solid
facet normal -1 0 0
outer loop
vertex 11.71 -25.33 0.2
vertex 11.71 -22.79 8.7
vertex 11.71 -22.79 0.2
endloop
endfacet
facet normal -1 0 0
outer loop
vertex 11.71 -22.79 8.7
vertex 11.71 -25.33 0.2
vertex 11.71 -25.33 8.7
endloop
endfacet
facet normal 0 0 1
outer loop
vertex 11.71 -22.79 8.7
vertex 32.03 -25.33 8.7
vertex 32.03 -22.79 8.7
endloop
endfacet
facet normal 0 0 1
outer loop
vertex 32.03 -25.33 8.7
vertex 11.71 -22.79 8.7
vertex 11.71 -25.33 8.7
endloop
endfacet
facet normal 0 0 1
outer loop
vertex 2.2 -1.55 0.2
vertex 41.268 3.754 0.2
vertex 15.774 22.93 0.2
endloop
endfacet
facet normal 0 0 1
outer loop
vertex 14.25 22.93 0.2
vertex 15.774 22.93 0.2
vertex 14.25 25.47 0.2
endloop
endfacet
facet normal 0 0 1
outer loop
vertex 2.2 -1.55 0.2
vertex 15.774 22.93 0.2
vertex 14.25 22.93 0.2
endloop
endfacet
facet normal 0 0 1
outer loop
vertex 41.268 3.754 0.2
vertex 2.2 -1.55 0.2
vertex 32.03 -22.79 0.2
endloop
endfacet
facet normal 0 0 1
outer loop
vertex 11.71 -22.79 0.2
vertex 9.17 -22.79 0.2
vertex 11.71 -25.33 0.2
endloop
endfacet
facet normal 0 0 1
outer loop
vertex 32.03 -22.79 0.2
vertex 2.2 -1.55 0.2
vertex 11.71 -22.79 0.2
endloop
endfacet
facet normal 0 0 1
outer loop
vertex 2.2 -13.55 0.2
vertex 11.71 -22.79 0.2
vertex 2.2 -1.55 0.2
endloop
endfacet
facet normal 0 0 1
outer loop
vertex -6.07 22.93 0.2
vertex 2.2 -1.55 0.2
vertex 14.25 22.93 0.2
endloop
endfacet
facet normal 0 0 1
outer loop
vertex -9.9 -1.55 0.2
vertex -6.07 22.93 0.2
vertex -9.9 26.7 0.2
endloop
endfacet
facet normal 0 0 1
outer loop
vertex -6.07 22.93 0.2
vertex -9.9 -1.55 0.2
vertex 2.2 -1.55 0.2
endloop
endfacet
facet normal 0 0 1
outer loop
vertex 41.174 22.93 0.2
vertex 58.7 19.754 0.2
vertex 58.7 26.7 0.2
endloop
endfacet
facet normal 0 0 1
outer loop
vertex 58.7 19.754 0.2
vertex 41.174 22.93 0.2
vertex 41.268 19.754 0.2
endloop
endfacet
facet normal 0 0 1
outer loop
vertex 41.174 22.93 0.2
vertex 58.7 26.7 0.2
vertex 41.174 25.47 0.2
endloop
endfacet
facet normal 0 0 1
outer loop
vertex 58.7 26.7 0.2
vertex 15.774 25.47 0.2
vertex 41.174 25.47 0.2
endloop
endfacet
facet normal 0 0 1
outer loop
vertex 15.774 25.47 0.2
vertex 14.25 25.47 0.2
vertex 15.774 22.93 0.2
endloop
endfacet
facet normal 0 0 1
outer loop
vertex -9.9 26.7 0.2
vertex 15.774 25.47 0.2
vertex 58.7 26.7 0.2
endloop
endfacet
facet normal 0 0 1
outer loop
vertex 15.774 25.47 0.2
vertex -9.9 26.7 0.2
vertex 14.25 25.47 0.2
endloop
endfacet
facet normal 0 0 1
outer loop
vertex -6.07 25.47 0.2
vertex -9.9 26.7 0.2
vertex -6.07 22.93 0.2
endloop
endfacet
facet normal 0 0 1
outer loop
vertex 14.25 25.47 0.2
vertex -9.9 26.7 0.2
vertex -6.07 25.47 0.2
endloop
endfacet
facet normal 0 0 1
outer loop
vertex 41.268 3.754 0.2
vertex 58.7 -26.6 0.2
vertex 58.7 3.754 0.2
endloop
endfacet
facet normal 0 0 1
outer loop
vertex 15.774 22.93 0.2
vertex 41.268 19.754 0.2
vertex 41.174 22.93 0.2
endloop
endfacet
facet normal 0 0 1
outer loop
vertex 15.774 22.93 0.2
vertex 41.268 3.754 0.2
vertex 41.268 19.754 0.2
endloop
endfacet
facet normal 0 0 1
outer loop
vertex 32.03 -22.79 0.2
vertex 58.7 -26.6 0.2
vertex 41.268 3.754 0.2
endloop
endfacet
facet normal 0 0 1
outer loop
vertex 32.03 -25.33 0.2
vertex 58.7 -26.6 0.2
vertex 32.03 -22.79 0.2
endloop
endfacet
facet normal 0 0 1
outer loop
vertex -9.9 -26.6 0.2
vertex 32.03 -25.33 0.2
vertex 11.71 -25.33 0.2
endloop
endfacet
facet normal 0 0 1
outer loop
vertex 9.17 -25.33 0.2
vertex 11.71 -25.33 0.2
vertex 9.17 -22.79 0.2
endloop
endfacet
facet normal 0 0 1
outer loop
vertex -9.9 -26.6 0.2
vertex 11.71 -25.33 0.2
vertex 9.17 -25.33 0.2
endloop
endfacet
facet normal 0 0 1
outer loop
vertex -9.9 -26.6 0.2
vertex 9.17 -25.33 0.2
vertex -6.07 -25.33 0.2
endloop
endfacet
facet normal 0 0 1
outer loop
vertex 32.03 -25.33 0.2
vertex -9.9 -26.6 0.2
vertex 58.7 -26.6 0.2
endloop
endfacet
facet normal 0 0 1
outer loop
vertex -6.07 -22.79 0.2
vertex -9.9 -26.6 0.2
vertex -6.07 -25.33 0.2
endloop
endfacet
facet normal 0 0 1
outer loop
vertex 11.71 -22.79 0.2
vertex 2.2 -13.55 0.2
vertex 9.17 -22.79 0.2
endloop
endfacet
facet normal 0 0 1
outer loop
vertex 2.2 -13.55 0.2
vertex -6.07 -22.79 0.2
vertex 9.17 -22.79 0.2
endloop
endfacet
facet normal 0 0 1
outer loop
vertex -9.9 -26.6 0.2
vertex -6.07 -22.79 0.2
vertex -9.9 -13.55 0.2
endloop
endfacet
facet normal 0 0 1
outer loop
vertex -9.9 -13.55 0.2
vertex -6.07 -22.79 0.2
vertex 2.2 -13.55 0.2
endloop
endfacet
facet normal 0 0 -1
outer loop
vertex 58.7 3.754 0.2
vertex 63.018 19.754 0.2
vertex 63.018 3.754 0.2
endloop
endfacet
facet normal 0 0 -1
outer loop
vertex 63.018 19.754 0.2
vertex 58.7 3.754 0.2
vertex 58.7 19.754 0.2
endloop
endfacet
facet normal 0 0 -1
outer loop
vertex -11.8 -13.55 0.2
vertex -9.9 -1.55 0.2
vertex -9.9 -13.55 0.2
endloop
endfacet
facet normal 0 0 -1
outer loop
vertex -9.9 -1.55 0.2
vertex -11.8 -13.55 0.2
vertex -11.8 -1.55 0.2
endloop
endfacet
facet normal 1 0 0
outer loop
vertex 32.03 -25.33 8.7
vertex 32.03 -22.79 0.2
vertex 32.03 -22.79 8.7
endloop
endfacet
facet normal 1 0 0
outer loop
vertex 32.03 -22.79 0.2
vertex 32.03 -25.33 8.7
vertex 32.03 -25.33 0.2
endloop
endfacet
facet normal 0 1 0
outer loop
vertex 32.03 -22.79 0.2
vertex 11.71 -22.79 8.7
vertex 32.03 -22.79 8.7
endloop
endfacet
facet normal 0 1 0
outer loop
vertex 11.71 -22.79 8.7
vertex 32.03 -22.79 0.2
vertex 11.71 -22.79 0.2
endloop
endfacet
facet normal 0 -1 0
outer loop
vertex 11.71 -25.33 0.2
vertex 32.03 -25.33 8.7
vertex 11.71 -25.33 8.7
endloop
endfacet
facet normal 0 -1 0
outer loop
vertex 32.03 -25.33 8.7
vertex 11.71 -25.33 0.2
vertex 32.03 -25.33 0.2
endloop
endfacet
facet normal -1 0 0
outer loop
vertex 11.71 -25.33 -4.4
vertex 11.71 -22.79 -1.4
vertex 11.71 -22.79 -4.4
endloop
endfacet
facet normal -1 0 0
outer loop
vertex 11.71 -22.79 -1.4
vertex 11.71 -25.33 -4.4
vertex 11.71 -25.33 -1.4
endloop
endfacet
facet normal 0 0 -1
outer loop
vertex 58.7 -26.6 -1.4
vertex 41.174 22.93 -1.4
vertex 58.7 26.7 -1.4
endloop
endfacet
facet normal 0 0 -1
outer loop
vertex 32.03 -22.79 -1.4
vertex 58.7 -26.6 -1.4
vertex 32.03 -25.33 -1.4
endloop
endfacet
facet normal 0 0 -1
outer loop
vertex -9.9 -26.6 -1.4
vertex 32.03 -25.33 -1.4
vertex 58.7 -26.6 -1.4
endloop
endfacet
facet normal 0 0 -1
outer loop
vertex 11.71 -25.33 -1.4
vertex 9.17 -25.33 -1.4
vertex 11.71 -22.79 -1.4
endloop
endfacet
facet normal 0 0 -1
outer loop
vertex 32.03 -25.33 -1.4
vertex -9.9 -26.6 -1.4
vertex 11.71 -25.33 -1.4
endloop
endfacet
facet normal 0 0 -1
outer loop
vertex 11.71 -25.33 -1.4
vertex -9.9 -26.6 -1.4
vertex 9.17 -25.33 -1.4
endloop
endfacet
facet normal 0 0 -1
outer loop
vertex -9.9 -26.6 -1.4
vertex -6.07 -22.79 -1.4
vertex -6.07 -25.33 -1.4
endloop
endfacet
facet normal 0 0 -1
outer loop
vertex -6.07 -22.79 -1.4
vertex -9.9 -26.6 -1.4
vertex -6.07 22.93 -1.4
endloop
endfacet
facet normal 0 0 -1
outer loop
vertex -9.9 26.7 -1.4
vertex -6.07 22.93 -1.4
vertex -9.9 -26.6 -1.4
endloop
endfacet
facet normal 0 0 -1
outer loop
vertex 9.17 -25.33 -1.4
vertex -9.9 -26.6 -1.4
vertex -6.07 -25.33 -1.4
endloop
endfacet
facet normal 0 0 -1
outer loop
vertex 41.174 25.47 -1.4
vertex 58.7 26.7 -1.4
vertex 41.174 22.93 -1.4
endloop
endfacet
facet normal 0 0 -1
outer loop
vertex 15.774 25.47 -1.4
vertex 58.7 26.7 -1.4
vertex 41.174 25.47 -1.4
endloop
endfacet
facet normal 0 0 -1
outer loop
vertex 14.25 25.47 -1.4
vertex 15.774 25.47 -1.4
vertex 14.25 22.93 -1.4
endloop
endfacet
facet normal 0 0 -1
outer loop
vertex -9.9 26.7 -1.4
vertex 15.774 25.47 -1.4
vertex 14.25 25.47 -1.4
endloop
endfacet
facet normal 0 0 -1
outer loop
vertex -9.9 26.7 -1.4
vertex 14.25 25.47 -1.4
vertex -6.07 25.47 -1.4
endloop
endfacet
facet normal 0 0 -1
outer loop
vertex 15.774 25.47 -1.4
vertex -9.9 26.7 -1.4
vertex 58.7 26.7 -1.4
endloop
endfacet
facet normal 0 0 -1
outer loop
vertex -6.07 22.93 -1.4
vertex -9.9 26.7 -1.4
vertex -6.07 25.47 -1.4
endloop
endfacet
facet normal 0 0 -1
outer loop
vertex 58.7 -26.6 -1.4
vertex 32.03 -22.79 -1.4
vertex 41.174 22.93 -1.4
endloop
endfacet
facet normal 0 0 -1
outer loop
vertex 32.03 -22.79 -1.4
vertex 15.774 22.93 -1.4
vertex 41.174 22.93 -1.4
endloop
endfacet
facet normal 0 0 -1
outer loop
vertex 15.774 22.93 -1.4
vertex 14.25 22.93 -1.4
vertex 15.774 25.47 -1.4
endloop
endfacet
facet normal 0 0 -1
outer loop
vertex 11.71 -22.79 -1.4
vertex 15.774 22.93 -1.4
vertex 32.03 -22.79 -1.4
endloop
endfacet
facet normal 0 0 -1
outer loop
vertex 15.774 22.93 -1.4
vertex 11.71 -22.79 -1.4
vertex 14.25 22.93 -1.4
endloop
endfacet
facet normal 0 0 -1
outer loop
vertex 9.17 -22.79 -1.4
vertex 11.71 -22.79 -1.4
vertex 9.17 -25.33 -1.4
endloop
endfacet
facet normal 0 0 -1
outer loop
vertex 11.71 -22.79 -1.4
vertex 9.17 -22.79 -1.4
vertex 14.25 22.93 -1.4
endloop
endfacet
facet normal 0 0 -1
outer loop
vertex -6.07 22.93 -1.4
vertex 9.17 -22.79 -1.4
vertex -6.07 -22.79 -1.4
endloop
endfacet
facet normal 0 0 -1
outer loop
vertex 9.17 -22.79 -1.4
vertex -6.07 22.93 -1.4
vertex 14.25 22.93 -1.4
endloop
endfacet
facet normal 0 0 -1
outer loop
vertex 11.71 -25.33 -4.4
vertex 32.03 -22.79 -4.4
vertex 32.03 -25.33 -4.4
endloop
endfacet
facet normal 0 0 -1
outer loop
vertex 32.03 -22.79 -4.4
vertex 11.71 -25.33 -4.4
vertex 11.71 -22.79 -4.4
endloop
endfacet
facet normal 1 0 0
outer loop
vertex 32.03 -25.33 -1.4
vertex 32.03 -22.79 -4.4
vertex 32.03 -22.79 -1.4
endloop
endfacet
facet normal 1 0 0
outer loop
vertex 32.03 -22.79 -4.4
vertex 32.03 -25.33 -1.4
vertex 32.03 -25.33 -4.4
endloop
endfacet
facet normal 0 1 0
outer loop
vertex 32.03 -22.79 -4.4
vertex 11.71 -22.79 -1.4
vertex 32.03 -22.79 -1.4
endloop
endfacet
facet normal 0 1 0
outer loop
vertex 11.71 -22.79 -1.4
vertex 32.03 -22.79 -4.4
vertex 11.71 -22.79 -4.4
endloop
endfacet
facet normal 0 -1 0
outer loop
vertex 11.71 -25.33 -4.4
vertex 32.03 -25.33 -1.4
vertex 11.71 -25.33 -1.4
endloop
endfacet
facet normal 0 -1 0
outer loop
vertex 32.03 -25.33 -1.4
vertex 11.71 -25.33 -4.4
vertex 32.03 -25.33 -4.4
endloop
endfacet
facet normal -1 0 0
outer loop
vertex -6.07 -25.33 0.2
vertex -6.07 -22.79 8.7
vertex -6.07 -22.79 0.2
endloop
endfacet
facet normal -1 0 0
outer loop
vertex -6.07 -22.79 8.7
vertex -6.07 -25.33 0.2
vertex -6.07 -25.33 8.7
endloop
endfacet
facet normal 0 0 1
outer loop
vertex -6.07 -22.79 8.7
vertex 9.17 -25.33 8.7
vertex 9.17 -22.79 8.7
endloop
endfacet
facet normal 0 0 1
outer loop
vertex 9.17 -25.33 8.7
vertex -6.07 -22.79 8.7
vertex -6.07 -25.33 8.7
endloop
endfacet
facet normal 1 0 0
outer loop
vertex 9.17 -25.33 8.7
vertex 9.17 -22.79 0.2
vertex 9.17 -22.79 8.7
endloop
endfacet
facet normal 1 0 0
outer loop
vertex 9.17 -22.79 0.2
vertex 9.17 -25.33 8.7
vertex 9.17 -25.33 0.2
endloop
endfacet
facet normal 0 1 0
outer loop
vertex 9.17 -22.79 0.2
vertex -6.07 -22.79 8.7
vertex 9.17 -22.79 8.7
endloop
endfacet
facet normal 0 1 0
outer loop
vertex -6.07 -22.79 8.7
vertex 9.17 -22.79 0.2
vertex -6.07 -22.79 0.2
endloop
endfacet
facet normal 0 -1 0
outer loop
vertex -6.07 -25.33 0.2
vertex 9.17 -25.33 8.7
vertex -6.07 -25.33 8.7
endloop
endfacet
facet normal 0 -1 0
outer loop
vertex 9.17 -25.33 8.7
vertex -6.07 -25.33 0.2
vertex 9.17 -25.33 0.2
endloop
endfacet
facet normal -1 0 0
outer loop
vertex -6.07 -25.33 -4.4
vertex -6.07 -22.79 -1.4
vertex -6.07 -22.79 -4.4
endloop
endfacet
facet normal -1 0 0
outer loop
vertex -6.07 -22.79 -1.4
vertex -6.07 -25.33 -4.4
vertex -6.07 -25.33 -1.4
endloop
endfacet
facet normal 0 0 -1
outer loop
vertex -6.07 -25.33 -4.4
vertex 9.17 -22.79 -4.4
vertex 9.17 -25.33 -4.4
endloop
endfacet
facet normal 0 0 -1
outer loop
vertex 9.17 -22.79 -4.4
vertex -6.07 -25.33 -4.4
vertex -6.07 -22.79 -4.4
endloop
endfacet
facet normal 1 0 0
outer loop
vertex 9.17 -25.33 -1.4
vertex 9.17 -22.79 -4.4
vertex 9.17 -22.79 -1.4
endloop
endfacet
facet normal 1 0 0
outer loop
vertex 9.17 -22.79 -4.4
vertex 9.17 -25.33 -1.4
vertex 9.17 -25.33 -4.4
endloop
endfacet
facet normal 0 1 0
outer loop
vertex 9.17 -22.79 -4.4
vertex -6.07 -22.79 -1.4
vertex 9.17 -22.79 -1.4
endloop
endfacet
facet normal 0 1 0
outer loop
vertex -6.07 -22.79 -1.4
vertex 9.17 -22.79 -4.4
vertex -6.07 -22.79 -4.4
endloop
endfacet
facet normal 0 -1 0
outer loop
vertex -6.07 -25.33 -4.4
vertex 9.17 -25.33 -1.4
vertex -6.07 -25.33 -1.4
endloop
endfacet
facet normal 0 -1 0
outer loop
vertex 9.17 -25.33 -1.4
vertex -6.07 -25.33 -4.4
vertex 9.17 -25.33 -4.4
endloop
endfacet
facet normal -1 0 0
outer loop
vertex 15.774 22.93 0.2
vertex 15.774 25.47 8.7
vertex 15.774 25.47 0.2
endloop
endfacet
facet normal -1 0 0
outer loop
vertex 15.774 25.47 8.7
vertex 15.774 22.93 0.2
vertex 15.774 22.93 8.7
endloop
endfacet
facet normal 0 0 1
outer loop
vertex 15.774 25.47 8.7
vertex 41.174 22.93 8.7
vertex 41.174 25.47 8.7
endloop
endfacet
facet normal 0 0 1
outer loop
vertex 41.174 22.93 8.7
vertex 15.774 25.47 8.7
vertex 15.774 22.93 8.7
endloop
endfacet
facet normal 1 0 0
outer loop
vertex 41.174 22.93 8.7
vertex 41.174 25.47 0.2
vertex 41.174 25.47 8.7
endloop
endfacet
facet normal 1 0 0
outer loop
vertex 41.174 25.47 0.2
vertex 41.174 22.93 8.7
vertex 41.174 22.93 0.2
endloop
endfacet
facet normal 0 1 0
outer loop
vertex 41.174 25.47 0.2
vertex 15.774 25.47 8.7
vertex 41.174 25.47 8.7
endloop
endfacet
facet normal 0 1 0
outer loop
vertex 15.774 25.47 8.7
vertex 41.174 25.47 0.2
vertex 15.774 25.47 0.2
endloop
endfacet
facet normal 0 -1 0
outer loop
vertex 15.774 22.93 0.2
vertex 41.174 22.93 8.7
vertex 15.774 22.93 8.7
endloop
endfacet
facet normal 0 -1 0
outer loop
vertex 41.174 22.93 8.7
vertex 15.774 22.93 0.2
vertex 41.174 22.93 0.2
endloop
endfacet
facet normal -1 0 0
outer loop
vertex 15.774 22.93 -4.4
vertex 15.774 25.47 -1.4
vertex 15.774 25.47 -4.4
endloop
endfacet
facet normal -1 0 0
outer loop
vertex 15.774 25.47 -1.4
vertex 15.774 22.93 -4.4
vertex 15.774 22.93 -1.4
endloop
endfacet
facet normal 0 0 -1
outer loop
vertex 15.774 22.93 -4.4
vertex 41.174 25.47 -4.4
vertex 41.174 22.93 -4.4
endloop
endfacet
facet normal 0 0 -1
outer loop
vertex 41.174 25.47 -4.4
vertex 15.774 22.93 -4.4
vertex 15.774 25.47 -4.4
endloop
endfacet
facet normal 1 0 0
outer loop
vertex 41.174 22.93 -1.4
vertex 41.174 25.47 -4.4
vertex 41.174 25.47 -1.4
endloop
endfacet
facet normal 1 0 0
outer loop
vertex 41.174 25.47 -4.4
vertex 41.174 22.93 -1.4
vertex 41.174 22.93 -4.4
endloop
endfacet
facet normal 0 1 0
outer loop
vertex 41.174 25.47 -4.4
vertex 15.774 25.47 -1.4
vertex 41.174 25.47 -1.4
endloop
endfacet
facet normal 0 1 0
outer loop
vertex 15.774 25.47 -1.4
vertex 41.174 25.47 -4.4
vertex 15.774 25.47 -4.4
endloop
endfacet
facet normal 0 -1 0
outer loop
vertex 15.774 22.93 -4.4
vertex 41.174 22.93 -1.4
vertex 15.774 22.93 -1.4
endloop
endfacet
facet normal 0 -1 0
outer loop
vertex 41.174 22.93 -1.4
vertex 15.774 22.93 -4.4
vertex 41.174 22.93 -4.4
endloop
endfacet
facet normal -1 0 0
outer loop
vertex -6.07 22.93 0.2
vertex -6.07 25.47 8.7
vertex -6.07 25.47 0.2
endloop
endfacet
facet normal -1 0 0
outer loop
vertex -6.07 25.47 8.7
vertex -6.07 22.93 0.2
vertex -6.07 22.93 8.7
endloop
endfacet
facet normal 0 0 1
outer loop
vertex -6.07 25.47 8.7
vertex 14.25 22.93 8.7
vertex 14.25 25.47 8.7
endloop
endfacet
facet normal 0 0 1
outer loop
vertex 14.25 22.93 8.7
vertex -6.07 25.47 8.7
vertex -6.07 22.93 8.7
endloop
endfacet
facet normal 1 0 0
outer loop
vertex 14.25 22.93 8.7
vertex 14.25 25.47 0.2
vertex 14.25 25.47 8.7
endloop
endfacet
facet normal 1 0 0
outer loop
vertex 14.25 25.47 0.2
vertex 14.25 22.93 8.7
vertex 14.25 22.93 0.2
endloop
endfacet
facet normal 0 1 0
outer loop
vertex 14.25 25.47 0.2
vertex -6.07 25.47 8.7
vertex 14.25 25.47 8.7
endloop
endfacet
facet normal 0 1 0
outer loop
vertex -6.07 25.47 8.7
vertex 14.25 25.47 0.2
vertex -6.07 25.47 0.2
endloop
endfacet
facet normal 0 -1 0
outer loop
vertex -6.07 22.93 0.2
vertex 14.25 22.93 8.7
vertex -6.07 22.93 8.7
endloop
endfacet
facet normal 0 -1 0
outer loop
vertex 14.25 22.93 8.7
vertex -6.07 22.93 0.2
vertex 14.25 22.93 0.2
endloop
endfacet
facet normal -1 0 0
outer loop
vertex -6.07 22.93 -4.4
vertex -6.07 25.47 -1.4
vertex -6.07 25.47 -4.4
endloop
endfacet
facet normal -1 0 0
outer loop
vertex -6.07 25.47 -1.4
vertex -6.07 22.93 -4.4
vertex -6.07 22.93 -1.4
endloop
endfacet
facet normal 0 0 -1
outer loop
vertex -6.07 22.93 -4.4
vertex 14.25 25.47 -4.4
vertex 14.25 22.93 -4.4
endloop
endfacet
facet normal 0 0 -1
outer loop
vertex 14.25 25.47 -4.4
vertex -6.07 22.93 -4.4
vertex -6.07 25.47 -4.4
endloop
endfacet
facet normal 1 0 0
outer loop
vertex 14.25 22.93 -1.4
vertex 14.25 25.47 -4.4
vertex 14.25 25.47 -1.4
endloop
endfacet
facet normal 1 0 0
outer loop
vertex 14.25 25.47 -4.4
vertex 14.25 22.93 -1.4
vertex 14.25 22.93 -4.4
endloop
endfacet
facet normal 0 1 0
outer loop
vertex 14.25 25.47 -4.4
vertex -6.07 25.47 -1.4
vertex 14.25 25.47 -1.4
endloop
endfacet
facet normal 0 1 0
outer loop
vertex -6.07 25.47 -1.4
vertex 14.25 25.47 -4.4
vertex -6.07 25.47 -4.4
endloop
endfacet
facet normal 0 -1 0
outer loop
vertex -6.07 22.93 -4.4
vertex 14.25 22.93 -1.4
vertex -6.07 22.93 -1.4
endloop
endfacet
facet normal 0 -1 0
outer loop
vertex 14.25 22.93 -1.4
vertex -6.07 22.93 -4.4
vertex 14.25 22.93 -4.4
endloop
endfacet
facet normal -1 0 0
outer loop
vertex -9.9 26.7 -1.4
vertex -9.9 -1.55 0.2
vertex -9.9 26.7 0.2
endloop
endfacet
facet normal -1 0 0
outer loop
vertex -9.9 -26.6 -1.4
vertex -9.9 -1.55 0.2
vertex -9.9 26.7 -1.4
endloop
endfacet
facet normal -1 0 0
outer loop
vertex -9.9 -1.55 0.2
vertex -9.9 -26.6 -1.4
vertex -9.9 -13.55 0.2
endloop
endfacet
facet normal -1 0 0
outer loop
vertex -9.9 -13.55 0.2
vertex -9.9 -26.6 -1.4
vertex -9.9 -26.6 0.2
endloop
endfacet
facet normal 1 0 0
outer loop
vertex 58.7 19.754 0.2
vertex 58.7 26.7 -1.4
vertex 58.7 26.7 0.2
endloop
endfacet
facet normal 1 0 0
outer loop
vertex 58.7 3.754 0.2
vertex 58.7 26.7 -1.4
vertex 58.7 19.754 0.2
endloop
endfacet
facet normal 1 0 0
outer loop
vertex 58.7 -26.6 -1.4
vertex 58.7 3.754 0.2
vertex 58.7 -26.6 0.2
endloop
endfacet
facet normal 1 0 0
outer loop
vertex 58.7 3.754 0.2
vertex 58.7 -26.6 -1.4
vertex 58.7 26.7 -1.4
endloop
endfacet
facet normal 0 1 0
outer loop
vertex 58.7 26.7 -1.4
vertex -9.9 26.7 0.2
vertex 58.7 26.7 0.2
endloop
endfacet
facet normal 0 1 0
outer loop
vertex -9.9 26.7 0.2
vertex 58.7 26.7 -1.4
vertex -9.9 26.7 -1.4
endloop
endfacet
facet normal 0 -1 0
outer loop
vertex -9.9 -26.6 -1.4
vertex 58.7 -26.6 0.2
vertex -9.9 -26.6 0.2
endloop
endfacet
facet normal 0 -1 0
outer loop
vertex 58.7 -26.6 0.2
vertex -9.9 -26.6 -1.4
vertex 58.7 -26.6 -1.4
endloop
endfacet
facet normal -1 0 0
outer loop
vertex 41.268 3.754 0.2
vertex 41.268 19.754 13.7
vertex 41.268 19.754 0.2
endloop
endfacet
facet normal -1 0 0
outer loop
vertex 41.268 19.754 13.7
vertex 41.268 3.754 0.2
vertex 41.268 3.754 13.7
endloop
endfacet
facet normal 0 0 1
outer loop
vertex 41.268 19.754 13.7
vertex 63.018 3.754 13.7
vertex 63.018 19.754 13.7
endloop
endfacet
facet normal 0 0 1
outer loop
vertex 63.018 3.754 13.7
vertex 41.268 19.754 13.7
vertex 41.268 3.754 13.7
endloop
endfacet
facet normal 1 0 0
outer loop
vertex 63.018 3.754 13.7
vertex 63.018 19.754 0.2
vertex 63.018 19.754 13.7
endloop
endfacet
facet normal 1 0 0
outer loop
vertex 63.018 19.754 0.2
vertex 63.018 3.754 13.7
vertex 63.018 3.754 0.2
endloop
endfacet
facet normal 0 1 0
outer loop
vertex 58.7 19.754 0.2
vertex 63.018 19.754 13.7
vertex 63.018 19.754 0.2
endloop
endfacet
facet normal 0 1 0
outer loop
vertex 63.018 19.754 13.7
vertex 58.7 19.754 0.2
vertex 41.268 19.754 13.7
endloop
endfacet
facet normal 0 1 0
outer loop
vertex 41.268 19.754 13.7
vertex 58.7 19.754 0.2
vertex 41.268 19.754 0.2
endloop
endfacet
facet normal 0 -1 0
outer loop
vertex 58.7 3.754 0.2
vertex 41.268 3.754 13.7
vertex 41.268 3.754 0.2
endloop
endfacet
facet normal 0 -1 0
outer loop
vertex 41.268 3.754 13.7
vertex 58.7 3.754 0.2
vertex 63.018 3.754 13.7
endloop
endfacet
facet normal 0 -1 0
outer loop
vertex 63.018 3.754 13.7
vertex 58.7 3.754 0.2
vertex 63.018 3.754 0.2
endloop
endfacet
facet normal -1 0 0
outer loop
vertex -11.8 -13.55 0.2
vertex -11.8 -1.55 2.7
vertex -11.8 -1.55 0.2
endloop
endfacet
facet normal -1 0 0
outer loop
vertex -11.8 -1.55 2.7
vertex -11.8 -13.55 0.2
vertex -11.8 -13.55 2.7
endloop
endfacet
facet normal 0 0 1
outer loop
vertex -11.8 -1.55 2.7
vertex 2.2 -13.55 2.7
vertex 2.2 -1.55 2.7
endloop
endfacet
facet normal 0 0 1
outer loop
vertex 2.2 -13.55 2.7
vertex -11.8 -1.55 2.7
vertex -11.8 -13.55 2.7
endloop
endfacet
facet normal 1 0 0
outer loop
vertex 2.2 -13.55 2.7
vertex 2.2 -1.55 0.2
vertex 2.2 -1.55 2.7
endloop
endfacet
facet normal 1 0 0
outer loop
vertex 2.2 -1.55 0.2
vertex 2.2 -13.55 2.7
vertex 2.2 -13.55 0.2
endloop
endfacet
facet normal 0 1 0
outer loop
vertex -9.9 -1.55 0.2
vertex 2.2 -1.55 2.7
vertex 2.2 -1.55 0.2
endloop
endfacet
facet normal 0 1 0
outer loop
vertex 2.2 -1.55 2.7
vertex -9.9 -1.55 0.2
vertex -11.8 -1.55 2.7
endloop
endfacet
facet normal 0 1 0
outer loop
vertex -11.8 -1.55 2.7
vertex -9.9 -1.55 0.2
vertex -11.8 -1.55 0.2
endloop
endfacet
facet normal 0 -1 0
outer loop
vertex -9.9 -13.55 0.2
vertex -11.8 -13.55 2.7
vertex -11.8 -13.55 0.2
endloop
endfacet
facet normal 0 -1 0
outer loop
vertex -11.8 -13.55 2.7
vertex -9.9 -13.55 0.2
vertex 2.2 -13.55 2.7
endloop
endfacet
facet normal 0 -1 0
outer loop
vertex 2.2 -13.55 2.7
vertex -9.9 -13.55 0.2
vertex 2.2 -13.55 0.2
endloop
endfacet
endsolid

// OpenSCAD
// board_model.scad — Simplified Ethernet Shield 3D model for verification
//
// Built from EAGLE BRD data. The board's X axis is REVERSED relative
// to the case X axis (board X=0 is at the right wall, board X increases
// toward the left). We use mirror([1,0,0]) to flip the board model.

include <config.scad>

module ethernet_shield_pcb() {
    color(color_board)
        cube([eth_length, eth_width, eth_pcb_thickness]);
}

module rj45_housing() {
    // RJ45 jack housing (UC1)
    // The housing body sits on the PCB extending in the +X direction
    // (into the board). Port face is at x = rj45_board_x.
    color(color_rj45)
        translate([
            rj45_board_x,
            rj45_board_y - rj45_housing_w / 2,
            eth_pcb_thickness
        ])
            cube([rj45_housing_d, rj45_housing_w, rj45_housing_h]);
}

module sd_card_slot() {
    // Micro-SD card slot (X1) — rotated R270
    color(color_sd)
        translate([
            sd_board_x - sd_slot_d / 2,
            sd_board_y - sd_slot_w / 2,
            eth_pcb_thickness
        ])
            cube([sd_slot_d, sd_slot_w, sd_slot_h]);
}

module header_row(x, y, pins, pitch) {
    header_length = pins * pitch;
    header_width = pitch;
    header_height_above = 8.5;
    header_height_below = 3.0;

    color([0.2, 0.2, 0.2, 0.6]) {
        translate([x - header_length / 2, y - header_width / 2, eth_pcb_thickness])
            cube([header_length, header_width, header_height_above]);
        translate([x - header_length / 2, y - header_width / 2, -header_height_below])
            cube([header_length, header_width, header_height_below]);
    }
}

module ethernet_shield() {
    // Complete Ethernet Shield in board-local coordinates.
    // Origin at bottom-left mounting hole.
    ethernet_shield_pcb();
    rj45_housing();
    sd_card_slot();
    header_row(power_header_x, power_header_y, power_header_pins, header_pitch);
    header_row(janalog_header_x, janalog_header_y, janalog_header_pins, header_pitch);
    header_row(jhigh_header_x, jhigh_header_y, jhigh_header_pins, header_pitch);
    header_row(jlow_header_x, jlow_header_y, jlow_header_pins, header_pitch);
}

module ethernet_shield_in_case() {
    // Position the shield in case coordinates.
    // Board X is reversed: case_x = board_case_origin_x - board_x
    // We achieve this by translating to the origin point and mirroring in X.
    translate([board_case_origin_x, board_case_origin_y, eth_pcb_bottom_z])
        mirror([1, 0, 0])
            ethernet_shield();
}

ethernet_shield_in_case();
